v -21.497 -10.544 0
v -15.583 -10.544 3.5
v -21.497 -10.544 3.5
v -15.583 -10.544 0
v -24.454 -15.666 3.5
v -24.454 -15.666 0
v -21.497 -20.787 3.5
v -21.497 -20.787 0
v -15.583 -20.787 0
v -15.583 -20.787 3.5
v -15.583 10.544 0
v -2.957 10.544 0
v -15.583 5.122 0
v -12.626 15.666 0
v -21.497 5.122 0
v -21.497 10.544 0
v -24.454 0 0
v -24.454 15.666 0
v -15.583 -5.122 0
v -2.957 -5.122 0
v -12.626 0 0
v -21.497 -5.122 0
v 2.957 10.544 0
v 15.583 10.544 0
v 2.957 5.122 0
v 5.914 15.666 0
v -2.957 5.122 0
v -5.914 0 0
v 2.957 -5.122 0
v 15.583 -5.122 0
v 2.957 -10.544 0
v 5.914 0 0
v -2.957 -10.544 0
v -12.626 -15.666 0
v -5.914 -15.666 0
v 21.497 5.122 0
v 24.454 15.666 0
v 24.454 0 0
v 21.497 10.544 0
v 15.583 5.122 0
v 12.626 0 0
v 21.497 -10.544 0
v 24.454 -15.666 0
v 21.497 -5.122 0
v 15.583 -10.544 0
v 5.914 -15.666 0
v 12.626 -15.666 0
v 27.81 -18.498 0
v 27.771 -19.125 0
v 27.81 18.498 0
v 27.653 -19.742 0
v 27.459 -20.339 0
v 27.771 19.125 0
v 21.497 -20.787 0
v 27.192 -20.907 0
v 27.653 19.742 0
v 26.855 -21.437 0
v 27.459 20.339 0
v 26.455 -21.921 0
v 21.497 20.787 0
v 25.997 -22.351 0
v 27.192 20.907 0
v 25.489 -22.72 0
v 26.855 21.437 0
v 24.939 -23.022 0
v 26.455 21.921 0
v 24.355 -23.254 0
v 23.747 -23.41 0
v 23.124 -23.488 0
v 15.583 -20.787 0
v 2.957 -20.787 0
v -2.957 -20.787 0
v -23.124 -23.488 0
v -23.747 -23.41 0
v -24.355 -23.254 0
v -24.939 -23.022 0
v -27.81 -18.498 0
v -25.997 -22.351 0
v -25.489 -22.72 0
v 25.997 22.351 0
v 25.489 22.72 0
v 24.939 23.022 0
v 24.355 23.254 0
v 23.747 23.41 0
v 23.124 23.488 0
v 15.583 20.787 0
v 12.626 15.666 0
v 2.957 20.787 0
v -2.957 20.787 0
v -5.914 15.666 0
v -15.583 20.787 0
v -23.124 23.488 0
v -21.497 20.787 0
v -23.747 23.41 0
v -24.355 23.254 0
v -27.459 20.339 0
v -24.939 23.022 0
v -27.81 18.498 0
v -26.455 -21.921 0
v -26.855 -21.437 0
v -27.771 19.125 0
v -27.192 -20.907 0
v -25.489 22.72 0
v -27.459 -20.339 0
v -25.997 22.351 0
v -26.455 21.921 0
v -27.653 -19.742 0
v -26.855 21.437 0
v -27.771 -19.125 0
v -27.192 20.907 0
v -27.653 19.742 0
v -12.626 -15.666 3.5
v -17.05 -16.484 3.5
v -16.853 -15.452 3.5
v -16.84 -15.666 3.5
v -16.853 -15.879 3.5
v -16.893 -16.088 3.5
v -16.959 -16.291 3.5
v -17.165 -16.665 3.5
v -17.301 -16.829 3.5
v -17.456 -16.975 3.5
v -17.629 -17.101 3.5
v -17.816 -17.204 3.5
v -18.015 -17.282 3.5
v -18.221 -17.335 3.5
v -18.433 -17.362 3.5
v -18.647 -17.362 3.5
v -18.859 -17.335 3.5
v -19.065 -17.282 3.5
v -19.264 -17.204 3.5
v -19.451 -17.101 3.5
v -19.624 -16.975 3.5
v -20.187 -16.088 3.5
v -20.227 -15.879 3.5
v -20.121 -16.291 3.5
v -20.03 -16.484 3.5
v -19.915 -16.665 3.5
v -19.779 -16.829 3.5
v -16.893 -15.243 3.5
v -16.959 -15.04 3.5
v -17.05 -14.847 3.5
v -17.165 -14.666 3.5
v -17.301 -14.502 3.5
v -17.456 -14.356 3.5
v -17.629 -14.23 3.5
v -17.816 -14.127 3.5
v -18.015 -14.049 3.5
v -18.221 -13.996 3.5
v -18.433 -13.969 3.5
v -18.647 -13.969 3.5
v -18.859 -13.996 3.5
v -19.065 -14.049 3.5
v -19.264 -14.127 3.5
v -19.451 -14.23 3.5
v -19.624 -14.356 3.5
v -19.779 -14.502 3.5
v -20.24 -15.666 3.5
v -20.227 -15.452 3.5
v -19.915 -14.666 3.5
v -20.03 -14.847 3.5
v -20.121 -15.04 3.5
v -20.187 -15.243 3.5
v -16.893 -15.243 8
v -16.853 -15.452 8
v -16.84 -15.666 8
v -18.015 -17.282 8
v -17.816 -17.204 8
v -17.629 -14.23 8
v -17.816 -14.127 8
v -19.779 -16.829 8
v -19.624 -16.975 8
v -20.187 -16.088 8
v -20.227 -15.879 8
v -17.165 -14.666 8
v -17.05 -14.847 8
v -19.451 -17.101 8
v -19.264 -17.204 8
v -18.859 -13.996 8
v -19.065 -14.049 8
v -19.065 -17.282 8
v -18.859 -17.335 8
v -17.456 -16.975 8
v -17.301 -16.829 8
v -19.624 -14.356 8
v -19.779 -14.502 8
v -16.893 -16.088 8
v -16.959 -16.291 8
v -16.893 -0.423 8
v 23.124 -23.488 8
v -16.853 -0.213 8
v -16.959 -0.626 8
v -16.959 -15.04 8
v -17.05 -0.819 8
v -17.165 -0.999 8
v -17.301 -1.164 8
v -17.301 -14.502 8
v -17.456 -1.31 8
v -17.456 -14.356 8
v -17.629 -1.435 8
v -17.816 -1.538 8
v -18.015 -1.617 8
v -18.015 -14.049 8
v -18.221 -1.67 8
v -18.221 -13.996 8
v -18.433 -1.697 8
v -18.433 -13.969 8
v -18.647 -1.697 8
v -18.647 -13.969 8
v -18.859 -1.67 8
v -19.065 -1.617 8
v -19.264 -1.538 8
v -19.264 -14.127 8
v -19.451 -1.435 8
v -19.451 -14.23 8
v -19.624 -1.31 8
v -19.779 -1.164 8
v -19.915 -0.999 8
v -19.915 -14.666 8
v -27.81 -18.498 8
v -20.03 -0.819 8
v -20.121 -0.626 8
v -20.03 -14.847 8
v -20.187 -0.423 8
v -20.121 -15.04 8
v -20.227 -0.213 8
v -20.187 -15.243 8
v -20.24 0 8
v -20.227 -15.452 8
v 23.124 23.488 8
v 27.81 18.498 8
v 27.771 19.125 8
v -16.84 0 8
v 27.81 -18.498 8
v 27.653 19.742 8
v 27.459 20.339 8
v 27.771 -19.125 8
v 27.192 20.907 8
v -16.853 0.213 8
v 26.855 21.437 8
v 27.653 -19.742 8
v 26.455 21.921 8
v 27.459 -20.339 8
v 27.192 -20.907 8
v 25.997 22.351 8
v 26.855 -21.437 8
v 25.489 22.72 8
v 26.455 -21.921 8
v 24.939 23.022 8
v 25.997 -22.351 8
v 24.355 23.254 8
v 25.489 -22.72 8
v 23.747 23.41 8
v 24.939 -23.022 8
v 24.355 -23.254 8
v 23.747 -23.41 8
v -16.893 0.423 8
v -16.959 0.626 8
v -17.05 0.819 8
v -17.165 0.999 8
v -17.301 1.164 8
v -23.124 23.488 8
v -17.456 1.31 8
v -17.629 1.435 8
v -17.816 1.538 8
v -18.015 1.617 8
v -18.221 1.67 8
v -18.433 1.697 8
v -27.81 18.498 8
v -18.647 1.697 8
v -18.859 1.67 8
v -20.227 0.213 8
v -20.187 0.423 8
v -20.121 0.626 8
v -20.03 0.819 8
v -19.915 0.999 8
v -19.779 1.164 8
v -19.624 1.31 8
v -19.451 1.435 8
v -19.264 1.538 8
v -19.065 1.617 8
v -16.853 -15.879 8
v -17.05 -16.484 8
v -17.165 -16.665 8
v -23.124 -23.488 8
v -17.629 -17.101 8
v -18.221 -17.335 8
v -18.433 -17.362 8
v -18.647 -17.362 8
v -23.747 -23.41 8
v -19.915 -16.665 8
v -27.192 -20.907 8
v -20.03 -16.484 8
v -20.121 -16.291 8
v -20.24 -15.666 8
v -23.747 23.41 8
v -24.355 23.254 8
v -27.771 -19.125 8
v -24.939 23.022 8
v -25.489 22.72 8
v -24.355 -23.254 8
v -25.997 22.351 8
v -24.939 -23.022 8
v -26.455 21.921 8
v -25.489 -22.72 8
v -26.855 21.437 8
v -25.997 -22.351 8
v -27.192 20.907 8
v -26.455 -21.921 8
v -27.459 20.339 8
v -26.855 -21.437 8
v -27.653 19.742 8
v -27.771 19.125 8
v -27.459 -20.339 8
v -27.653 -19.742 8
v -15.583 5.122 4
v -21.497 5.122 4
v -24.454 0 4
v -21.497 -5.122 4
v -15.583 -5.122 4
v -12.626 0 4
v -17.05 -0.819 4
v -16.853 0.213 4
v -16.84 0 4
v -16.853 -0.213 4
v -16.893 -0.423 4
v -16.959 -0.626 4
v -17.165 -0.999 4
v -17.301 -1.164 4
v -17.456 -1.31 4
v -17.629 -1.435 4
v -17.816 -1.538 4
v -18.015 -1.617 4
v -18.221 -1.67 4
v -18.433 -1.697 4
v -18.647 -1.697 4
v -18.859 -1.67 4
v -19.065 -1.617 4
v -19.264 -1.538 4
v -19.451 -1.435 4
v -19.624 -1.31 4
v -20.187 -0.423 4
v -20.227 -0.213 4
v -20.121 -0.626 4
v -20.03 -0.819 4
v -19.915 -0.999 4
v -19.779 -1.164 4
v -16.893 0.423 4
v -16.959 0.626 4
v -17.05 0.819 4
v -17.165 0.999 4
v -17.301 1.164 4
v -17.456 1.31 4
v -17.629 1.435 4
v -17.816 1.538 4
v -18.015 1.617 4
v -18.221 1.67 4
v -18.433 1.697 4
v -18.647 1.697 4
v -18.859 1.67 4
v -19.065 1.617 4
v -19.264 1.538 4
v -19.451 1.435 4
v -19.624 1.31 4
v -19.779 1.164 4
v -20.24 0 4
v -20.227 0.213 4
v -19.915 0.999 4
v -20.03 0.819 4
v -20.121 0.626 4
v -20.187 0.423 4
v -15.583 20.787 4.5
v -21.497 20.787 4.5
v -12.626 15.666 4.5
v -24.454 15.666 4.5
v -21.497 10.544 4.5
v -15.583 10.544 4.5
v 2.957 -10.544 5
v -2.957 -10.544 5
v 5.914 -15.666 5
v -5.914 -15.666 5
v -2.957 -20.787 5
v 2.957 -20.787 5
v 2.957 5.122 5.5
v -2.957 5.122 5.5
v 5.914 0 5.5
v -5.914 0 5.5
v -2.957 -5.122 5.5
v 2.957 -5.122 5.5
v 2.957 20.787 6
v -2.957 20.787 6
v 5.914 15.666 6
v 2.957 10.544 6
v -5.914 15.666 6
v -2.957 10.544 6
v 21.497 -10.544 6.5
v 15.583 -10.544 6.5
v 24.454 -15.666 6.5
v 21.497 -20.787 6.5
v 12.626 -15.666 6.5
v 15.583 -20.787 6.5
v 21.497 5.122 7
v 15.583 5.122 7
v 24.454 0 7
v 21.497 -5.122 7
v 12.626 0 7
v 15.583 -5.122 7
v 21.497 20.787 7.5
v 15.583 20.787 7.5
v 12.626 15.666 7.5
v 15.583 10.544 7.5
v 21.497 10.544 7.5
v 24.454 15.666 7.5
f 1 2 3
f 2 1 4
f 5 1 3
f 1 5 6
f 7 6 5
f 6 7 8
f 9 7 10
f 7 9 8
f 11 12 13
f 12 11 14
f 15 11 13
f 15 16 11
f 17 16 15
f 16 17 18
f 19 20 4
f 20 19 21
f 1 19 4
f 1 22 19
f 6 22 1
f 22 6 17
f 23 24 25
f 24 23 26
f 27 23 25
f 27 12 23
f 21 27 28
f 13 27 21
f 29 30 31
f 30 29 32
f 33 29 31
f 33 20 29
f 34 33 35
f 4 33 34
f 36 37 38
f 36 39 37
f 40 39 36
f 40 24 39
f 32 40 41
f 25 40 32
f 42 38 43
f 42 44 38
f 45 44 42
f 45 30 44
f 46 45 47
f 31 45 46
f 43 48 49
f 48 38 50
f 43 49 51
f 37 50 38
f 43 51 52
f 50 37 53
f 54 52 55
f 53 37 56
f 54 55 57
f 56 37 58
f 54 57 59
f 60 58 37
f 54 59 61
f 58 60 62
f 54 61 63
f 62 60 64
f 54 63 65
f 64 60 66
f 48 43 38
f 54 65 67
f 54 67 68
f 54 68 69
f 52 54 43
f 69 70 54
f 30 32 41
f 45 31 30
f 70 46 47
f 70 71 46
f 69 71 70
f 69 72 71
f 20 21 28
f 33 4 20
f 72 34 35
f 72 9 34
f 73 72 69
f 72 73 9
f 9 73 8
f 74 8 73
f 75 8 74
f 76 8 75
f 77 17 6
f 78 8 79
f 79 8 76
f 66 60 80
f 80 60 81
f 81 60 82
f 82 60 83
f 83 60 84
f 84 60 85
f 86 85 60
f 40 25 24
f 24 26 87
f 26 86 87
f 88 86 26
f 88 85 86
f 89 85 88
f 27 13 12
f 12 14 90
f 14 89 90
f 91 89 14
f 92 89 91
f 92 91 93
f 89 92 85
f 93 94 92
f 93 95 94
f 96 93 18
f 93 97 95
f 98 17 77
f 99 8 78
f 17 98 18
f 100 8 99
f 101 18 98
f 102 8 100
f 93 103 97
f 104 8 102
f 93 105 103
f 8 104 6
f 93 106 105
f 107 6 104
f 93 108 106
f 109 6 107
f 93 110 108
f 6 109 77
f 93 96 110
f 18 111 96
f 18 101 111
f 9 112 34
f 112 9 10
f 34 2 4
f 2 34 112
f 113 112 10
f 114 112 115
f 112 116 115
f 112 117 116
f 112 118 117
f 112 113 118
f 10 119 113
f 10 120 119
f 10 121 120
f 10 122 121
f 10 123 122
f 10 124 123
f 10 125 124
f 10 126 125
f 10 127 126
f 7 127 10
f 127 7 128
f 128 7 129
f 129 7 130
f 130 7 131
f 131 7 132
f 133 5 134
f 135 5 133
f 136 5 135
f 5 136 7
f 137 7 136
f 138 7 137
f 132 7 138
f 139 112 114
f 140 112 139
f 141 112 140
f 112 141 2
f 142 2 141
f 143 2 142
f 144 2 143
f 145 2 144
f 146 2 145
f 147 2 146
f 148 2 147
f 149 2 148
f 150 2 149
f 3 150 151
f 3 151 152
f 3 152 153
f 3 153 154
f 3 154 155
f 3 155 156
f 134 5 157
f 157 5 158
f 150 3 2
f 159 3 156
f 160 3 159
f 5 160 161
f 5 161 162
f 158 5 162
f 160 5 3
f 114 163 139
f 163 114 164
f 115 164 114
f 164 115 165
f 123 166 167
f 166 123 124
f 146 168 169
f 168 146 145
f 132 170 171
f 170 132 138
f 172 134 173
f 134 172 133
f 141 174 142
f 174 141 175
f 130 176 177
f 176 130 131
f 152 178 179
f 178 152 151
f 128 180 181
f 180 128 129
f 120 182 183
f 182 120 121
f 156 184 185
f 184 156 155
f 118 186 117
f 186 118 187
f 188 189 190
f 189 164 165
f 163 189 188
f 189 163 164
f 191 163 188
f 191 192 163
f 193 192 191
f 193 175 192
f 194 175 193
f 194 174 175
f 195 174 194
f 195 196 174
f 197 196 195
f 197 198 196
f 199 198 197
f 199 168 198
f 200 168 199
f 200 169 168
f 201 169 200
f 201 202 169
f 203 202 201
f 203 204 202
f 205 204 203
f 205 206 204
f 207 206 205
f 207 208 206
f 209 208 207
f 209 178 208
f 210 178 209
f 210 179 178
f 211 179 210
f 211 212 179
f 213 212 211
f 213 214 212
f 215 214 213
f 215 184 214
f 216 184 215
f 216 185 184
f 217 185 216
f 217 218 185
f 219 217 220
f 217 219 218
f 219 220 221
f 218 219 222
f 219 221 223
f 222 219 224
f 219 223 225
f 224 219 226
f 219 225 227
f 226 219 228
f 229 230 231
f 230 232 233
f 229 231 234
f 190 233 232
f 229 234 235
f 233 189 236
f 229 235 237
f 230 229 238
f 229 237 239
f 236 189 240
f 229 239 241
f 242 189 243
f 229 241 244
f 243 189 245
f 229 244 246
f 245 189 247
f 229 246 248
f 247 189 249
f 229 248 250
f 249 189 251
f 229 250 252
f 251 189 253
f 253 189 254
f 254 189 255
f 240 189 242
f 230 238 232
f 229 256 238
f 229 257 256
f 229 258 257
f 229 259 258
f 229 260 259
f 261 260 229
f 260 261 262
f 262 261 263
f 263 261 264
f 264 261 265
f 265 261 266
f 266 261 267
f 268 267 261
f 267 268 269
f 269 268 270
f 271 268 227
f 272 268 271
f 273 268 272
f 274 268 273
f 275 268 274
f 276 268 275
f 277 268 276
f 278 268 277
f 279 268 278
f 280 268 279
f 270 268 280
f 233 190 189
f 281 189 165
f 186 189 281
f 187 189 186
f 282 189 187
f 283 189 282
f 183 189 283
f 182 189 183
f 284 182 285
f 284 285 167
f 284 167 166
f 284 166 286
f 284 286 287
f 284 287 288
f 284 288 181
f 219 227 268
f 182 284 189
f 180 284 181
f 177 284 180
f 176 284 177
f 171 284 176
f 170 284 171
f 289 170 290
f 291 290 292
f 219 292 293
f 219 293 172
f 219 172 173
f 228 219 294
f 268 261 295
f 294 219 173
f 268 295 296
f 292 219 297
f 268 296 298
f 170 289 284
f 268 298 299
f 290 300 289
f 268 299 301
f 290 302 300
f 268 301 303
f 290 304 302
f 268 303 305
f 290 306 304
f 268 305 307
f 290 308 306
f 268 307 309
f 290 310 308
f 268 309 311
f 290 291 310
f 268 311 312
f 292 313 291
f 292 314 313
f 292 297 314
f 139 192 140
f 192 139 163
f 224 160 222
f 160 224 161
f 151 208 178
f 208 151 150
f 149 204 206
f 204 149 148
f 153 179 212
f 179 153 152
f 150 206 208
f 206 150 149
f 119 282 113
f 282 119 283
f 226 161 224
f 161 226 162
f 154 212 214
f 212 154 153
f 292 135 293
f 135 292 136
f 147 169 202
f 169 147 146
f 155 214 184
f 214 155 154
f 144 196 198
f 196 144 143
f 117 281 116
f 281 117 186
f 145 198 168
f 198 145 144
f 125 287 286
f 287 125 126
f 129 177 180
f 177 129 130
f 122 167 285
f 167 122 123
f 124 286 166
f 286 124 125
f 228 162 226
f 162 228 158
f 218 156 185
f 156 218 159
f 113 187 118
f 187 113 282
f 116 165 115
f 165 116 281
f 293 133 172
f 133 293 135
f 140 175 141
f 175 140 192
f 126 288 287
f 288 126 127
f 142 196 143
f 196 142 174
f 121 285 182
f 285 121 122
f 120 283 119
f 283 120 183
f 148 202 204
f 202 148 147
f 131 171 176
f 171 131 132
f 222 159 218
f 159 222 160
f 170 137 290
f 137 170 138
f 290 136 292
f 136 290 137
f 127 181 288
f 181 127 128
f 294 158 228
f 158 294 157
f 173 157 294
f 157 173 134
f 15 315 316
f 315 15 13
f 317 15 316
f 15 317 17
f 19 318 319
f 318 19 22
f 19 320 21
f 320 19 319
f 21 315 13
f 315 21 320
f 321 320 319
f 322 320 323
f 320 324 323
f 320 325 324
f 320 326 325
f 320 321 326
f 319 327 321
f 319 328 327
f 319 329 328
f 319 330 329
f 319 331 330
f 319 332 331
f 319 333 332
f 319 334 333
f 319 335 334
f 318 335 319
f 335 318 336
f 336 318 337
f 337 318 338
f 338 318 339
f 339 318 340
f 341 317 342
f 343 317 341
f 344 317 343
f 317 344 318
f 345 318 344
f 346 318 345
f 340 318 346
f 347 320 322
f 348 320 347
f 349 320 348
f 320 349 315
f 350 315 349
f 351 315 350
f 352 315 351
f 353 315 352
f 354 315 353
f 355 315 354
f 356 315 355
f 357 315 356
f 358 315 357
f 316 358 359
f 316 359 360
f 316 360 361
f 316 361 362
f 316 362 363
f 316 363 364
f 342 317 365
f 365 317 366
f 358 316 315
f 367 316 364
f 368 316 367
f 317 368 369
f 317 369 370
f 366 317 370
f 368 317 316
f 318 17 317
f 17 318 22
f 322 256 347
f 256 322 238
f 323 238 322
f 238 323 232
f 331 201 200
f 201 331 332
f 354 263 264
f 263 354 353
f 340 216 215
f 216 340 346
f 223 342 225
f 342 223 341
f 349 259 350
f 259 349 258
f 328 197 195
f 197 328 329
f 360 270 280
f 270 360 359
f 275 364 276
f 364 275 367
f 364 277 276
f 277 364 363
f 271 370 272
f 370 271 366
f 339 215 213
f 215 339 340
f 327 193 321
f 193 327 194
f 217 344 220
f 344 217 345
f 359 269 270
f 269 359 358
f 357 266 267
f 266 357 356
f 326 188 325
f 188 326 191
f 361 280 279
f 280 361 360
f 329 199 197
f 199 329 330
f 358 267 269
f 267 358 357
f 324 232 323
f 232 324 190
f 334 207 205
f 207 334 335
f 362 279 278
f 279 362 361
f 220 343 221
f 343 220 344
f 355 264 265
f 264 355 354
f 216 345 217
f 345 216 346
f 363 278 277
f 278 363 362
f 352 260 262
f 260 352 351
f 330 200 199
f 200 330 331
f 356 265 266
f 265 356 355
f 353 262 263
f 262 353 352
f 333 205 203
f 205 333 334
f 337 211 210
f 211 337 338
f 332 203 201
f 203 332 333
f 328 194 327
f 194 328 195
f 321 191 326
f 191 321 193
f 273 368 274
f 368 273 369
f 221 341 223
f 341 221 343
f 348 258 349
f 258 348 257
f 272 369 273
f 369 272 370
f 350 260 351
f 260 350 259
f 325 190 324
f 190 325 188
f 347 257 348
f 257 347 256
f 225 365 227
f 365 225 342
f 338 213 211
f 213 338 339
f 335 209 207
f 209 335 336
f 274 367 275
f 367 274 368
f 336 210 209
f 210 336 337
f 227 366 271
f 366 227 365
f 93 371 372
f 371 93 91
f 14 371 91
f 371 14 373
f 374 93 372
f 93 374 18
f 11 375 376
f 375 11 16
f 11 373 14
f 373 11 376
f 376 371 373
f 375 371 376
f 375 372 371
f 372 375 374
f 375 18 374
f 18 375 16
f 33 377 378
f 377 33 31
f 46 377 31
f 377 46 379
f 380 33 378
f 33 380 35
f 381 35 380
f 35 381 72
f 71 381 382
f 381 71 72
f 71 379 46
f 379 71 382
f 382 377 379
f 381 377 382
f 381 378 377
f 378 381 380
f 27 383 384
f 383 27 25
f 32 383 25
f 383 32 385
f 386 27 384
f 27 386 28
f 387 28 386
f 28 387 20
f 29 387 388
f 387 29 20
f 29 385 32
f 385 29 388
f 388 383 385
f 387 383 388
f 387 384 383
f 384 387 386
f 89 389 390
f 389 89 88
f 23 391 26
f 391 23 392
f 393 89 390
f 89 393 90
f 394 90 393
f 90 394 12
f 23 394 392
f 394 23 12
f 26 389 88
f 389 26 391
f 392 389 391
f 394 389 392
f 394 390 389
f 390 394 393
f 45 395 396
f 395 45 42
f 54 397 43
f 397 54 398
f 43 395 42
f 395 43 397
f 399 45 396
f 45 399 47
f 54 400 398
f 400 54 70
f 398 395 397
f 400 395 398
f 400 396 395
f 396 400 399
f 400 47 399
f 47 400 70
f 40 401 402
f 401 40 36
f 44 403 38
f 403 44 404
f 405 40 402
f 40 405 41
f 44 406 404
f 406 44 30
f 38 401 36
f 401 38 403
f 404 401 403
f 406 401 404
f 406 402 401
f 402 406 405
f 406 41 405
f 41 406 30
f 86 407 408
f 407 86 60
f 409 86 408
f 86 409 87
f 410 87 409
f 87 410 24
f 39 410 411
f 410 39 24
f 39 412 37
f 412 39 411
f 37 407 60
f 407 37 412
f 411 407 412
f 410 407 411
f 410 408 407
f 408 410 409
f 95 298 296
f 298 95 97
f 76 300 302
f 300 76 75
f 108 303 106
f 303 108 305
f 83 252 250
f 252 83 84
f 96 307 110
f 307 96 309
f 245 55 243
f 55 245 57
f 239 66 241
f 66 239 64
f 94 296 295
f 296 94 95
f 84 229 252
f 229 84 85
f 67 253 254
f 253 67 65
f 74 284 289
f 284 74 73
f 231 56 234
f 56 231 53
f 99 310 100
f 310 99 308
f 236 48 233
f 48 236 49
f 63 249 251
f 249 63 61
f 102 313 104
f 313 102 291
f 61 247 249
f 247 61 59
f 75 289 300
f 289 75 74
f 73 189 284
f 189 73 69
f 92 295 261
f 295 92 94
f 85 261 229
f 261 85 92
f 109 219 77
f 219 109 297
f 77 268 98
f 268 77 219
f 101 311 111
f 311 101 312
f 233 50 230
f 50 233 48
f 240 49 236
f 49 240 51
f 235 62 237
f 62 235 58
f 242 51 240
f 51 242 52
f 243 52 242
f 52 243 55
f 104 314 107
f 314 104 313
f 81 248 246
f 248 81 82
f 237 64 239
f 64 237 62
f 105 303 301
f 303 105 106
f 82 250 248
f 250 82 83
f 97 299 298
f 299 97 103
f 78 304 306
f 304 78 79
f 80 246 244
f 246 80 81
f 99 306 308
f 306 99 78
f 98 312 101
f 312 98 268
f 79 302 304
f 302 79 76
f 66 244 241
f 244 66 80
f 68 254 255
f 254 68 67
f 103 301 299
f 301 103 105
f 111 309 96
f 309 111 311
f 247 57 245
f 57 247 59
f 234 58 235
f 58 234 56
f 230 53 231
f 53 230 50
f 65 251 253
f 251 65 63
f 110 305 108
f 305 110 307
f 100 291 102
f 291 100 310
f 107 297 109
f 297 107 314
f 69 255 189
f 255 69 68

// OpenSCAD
$fn = 50;


difference() {
	union() {
		translate(v = [0, 0, 0]) {
			rotate(a = [0, 0, 0]) {
				hull() {
					translate(v = [-22.8100000000, 18.4982668977, 0]) {
						rotate(a = [0, 0, 0]) {
							translate(v = [0, 0, 0]) {
								rotate(a = [0, 0, 0]) {
									cylinder(h = 8, r = 5);
								}
							}
						}
					}
					translate(v = [22.8100000000, 18.4982668977, 0]) {
						rotate(a = [0, 0, 0]) {
							translate(v = [0, 0, 0]) {
								rotate(a = [0, 0, 0]) {
									cylinder(h = 8, r = 5);
								}
							}
						}
					}
					translate(v = [-22.8100000000, -18.4982668977, 0]) {
						rotate(a = [0, 0, 0]) {
							translate(v = [0, 0, 0]) {
								rotate(a = [0, 0, 0]) {
									cylinder(h = 8, r = 5);
								}
							}
						}
					}
					translate(v = [22.8100000000, -18.4982668977, 0]) {
						rotate(a = [0, 0, 0]) {
							translate(v = [0, 0, 0]) {
								rotate(a = [0, 0, 0]) {
									cylinder(h = 8, r = 5);
								}
							}
						}
					}
				}
			}
		}
	}
	union() {
		translate(v = [-18.5400000000, -15.6655112652, 0]) {
			rotate(a = [0, 0, 0]) {
				#translate(v = [0, 0, 0]) {
					rotate(a = [0, 0, 0]) {
						linear_extrude(height = 3.5000000000) {
							polygon(points = [[5.9142500000, 0.0000000000], [2.9571250000, 5.1218907443], [-2.9571250000, 5.1218907443], [-5.9142500000, 0.0000000000], [-2.9571250000, -5.1218907443], [2.9571250000, -5.1218907443]]);
						}
					}
				}
			}
		}
		translate(v = [-18.5400000000, -15.6655112652, 0]) {
			rotate(a = [0, 0, 0]) {
				cylinder(h = 8, r = 1.7000000000);
			}
		}
		translate(v = [-18.5400000000, 0.0000000000, 0]) {
			rotate(a = [0, 0, 0]) {
				#translate(v = [0, 0, 0]) {
					rotate(a = [0, 0, 0]) {
						linear_extrude(height = 4.0000000000) {
							polygon(points = [[5.9142500000, 0.0000000000], [2.9571250000, 5.1218907443], [-2.9571250000, 5.1218907443], [-5.9142500000, 0.0000000000], [-2.9571250000, -5.1218907443], [2.9571250000, -5.1218907443]]);
						}
					}
				}
			}
		}
		translate(v = [-18.5400000000, 0.0000000000, 0]) {
			rotate(a = [0, 0, 0]) {
				cylinder(h = 8, r = 1.7000000000);
			}
		}
		translate(v = [-18.5400000000, 15.6655112652, 0]) {
			rotate(a = [0, 0, 0]) {
				#translate(v = [0, 0, 0]) {
					rotate(a = [0, 0, 0]) {
						linear_extrude(height = 4.5000000000) {
							polygon(points = [[5.9142500000, 0.0000000000], [2.9571250000, 5.1218907443], [-2.9571250000, 5.1218907443], [-5.9142500000, 0.0000000000], [-2.9571250000, -5.1218907443], [2.9571250000, -5.1218907443]]);
						}
					}
				}
			}
		}
		translate(v = [0.0000000000, -15.6655112652, 0]) {
			rotate(a = [0, 0, 0]) {
				#translate(v = [0, 0, 0]) {
					rotate(a = [0, 0, 0]) {
						linear_extrude(height = 5.0000000000) {
							polygon(points = [[5.9142500000, 0.0000000000], [2.9571250000, 5.1218907443], [-2.9571250000, 5.1218907443], [-5.9142500000, 0.0000000000], [-2.9571250000, -5.1218907443], [2.9571250000, -5.1218907443]]);
						}
					}
				}
			}
		}
		translate(v = [0.0000000000, 0.0000000000, 0]) {
			rotate(a = [0, 0, 0]) {
				#translate(v = [0, 0, 0]) {
					rotate(a = [0, 0, 0]) {
						linear_extrude(height = 5.5000000000) {
							polygon(points = [[5.9142500000, 0.0000000000], [2.9571250000, 5.1218907443], [-2.9571250000, 5.1218907443], [-5.9142500000, 0.0000000000], [-2.9571250000, -5.1218907443], [2.9571250000, -5.1218907443]]);
						}
					}
				}
			}
		}
		translate(v = [0.0000000000, 15.6655112652, 0]) {
			rotate(a = [0, 0, 0]) {
				#translate(v = [0, 0, 0]) {
					rotate(a = [0, 0, 0]) {
						linear_extrude(height = 6.0000000000) {
							polygon(points = [[5.9142500000, 0.0000000000], [2.9571250000, 5.1218907443], [-2.9571250000, 5.1218907443], [-5.9142500000, 0.0000000000], [-2.9571250000, -5.1218907443], [2.9571250000, -5.1218907443]]);
						}
					}
				}
			}
		}
		translate(v = [18.5400000000, -15.6655112652, 0]) {
			rotate(a = [0, 0, 0]) {
				#translate(v = [0, 0, 0]) {
					rotate(a = [0, 0, 0]) {
						linear_extrude(height = 6.5000000000) {
							polygon(points = [[5.9142500000, 0.0000000000], [2.9571250000, 5.1218907443], [-2.9571250000, 5.1218907443], [-5.9142500000, 0.0000000000], [-2.9571250000, -5.1218907443], [2.9571250000, -5.1218907443]]);
						}
					}
				}
			}
		}
		translate(v = [18.5400000000, 0.0000000000, 0]) {
			rotate(a = [0, 0, 0]) {
				#translate(v = [0, 0, 0]) {
					rotate(a = [0, 0, 0]) {
						linear_extrude(height = 7.0000000000) {
							polygon(points = [[5.9142500000, 0.0000000000], [2.9571250000, 5.1218907443], [-2.9571250000, 5.1218907443], [-5.9142500000, 0.0000000000], [-2.9571250000, -5.1218907443], [2.9571250000, -5.1218907443]]);
						}
					}
				}
			}
		}
		translate(v = [18.5400000000, 15.6655112652, 0]) {
			rotate(a = [0, 0, 0]) {
				#translate(v = [0, 0, 0]) {
					rotate(a = [0, 0, 0]) {
						linear_extrude(height = 7.5000000000) {
							polygon(points = [[5.9142500000, 0.0000000000], [2.9571250000, 5.1218907443], [-2.9571250000, 5.1218907443], [-5.9142500000, 0.0000000000], [-2.9571250000, -5.1218907443], [2.9571250000, -5.1218907443]]);
						}
					}
				}
			}
		}
	}
}
